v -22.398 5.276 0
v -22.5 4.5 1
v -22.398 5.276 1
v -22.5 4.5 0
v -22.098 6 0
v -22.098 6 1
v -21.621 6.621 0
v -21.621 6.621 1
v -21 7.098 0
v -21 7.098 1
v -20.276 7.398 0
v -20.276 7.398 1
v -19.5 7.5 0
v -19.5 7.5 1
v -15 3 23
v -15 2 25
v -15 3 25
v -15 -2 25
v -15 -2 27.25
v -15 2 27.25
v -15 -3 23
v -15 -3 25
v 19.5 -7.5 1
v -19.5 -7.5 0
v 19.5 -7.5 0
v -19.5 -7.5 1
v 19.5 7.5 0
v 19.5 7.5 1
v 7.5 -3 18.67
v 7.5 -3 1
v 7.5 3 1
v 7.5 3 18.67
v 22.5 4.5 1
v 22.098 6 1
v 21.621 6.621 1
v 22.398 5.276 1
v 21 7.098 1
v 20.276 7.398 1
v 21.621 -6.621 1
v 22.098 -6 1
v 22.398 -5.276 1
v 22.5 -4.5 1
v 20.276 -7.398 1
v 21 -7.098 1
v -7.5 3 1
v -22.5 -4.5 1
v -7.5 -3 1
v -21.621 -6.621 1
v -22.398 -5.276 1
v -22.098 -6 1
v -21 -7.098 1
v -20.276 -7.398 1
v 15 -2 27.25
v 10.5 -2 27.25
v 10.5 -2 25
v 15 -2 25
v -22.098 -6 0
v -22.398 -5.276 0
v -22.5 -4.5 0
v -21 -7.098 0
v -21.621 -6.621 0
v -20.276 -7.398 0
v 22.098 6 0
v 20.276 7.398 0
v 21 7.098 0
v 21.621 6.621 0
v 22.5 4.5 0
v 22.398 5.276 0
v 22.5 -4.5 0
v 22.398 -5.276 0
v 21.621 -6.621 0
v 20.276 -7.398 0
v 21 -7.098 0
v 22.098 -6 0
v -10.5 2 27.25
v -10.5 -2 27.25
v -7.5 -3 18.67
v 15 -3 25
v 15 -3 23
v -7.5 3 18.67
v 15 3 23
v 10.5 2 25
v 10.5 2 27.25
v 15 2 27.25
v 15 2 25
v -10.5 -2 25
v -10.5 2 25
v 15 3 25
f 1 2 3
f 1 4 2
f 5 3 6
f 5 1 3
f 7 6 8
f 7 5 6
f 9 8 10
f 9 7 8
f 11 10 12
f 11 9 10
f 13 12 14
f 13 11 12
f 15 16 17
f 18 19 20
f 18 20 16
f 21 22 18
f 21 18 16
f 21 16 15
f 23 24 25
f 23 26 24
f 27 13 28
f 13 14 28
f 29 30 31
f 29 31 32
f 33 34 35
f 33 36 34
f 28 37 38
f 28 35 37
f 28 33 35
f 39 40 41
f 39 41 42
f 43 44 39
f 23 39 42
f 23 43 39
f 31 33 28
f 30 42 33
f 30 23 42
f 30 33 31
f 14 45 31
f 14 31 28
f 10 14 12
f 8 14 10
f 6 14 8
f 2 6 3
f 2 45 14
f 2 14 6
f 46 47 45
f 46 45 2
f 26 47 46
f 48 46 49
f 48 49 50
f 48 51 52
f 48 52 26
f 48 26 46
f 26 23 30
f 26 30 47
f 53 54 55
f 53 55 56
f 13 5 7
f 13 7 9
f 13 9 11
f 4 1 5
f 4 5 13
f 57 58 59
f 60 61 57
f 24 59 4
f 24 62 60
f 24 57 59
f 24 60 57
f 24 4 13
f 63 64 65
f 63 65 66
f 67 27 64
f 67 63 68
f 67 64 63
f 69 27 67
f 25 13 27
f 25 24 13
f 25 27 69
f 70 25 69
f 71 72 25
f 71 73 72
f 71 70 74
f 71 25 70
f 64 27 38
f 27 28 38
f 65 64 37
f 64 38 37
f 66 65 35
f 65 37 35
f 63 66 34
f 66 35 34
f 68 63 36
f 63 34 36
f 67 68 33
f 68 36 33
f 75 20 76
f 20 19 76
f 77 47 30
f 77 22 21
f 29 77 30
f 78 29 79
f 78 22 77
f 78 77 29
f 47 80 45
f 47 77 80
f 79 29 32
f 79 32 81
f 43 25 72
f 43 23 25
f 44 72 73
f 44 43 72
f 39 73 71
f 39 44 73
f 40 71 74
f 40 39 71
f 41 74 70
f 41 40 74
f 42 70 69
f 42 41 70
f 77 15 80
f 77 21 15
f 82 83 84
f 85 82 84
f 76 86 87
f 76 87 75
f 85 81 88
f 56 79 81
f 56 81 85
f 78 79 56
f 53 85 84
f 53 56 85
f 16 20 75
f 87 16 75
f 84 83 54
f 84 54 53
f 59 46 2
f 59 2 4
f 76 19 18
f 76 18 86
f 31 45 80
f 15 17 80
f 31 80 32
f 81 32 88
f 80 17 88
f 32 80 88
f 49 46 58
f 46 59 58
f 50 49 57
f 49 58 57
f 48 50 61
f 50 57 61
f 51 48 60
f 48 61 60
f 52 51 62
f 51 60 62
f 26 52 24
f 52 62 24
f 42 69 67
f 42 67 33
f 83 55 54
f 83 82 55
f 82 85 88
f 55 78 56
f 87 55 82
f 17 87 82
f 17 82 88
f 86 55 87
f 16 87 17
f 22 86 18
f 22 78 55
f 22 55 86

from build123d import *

# Parameters (mm, degrees)
F4_DEPTH = 3
F5_DEPTH = 7.5
F3_W     = 4.5
F3_H     = 2.25
F6_DEPTH = 2
F7_R     = 3


with BuildPart() as f4:
    # F3 (on Front) → F4 (new body, symmetric)
    with BuildSketch(Plane.XZ):
        Polygon((-7.5, 18.6698729811), (-7.5, 1), (7.5, 1), (7.5, 18.6698729811), (15, 23), (15, 25), (10.5, 25), (-10.5, 25), (-15, 25), (-15, 23), align=None)
    extrude(amount=F4_DEPTH, both=True)

    # F3 (on Front) → F5 (join, symmetric)
    with BuildSketch(Plane.XZ):
        Polygon((-22.5, 1), (-22.5, 0), (22.5, 0), (22.5, 1), (7.5, 1), (-7.5, 1), align=None)
    extrude(amount=F5_DEPTH, both=True)

    # F3 (on Front) → F6 (join, symmetric)
    with BuildSketch(Plane.XZ):
        with Locations((12.75, 26.125)):
            Rectangle(F3_W, F3_H)
        with Locations((-12.75, 26.125)):
            Rectangle(F3_W, F3_H)
    extrude(amount=F6_DEPTH, both=True)

    # F7
    f7_edges = [f4.edges().sort_by_distance(p)[0] for p in [
        (22.5, -7.5, 0.5),
        (22.5, 7.5, 0.5),
        (-22.5, 7.5, 0.5),
        (-22.5, -7.5, 0.5),
    ]]
    fillet(f7_edges, radius=F7_R)


solid = f4.part
